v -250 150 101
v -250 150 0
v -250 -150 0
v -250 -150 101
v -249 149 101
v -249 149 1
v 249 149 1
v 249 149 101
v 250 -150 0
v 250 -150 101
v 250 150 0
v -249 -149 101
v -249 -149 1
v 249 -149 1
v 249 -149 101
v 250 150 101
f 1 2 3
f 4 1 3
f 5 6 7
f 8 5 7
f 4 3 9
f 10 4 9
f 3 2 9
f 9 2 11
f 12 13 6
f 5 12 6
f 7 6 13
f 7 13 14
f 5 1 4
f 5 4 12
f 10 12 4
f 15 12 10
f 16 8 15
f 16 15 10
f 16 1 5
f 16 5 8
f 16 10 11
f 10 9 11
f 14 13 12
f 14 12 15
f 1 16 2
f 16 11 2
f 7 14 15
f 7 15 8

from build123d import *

# Parameters (mm, degrees)
F0_W     = 500
F0_H     = 300
F1_DEPTH = 1
F2_W     = 1
F2_H     = 1
F2_W_2   = 498
F2_H_2   = 298
F3_DEPTH = 100


with BuildPart() as f1:
    # F0 (on Top) → F1 (new body)
    with BuildSketch(Plane.XY):
        Rectangle(F0_W, F0_H)
    extrude(amount=F1_DEPTH)

    # F2 (on face) → F3 (join)
    with BuildSketch(Plane.XY.offset(1)):
        with Locations((-249.5, 149.5)):
            Rectangle(F2_W, F2_H)
        with Locations((0, 149.5)):
            Rectangle(F2_W_2, F2_H)
        with Locations((-249.5, 0)):
            Rectangle(F2_W, F2_H_2)
        with Locations((249.5, 149.5)):
            Rectangle(F2_W, F2_H)
        with Locations((-249.5, -149.5)):
            Rectangle(F2_W, F2_H)
        with Locations((0, -149.5)):
            Rectangle(F2_W_2, F2_H)
        with Locations((249.5, 0)):
            Rectangle(F2_W, F2_H_2)
        with Locations((249.5, -149.5)):
            Rectangle(F2_W, F2_H)
    extrude(amount=F3_DEPTH)


solid = f1.part
